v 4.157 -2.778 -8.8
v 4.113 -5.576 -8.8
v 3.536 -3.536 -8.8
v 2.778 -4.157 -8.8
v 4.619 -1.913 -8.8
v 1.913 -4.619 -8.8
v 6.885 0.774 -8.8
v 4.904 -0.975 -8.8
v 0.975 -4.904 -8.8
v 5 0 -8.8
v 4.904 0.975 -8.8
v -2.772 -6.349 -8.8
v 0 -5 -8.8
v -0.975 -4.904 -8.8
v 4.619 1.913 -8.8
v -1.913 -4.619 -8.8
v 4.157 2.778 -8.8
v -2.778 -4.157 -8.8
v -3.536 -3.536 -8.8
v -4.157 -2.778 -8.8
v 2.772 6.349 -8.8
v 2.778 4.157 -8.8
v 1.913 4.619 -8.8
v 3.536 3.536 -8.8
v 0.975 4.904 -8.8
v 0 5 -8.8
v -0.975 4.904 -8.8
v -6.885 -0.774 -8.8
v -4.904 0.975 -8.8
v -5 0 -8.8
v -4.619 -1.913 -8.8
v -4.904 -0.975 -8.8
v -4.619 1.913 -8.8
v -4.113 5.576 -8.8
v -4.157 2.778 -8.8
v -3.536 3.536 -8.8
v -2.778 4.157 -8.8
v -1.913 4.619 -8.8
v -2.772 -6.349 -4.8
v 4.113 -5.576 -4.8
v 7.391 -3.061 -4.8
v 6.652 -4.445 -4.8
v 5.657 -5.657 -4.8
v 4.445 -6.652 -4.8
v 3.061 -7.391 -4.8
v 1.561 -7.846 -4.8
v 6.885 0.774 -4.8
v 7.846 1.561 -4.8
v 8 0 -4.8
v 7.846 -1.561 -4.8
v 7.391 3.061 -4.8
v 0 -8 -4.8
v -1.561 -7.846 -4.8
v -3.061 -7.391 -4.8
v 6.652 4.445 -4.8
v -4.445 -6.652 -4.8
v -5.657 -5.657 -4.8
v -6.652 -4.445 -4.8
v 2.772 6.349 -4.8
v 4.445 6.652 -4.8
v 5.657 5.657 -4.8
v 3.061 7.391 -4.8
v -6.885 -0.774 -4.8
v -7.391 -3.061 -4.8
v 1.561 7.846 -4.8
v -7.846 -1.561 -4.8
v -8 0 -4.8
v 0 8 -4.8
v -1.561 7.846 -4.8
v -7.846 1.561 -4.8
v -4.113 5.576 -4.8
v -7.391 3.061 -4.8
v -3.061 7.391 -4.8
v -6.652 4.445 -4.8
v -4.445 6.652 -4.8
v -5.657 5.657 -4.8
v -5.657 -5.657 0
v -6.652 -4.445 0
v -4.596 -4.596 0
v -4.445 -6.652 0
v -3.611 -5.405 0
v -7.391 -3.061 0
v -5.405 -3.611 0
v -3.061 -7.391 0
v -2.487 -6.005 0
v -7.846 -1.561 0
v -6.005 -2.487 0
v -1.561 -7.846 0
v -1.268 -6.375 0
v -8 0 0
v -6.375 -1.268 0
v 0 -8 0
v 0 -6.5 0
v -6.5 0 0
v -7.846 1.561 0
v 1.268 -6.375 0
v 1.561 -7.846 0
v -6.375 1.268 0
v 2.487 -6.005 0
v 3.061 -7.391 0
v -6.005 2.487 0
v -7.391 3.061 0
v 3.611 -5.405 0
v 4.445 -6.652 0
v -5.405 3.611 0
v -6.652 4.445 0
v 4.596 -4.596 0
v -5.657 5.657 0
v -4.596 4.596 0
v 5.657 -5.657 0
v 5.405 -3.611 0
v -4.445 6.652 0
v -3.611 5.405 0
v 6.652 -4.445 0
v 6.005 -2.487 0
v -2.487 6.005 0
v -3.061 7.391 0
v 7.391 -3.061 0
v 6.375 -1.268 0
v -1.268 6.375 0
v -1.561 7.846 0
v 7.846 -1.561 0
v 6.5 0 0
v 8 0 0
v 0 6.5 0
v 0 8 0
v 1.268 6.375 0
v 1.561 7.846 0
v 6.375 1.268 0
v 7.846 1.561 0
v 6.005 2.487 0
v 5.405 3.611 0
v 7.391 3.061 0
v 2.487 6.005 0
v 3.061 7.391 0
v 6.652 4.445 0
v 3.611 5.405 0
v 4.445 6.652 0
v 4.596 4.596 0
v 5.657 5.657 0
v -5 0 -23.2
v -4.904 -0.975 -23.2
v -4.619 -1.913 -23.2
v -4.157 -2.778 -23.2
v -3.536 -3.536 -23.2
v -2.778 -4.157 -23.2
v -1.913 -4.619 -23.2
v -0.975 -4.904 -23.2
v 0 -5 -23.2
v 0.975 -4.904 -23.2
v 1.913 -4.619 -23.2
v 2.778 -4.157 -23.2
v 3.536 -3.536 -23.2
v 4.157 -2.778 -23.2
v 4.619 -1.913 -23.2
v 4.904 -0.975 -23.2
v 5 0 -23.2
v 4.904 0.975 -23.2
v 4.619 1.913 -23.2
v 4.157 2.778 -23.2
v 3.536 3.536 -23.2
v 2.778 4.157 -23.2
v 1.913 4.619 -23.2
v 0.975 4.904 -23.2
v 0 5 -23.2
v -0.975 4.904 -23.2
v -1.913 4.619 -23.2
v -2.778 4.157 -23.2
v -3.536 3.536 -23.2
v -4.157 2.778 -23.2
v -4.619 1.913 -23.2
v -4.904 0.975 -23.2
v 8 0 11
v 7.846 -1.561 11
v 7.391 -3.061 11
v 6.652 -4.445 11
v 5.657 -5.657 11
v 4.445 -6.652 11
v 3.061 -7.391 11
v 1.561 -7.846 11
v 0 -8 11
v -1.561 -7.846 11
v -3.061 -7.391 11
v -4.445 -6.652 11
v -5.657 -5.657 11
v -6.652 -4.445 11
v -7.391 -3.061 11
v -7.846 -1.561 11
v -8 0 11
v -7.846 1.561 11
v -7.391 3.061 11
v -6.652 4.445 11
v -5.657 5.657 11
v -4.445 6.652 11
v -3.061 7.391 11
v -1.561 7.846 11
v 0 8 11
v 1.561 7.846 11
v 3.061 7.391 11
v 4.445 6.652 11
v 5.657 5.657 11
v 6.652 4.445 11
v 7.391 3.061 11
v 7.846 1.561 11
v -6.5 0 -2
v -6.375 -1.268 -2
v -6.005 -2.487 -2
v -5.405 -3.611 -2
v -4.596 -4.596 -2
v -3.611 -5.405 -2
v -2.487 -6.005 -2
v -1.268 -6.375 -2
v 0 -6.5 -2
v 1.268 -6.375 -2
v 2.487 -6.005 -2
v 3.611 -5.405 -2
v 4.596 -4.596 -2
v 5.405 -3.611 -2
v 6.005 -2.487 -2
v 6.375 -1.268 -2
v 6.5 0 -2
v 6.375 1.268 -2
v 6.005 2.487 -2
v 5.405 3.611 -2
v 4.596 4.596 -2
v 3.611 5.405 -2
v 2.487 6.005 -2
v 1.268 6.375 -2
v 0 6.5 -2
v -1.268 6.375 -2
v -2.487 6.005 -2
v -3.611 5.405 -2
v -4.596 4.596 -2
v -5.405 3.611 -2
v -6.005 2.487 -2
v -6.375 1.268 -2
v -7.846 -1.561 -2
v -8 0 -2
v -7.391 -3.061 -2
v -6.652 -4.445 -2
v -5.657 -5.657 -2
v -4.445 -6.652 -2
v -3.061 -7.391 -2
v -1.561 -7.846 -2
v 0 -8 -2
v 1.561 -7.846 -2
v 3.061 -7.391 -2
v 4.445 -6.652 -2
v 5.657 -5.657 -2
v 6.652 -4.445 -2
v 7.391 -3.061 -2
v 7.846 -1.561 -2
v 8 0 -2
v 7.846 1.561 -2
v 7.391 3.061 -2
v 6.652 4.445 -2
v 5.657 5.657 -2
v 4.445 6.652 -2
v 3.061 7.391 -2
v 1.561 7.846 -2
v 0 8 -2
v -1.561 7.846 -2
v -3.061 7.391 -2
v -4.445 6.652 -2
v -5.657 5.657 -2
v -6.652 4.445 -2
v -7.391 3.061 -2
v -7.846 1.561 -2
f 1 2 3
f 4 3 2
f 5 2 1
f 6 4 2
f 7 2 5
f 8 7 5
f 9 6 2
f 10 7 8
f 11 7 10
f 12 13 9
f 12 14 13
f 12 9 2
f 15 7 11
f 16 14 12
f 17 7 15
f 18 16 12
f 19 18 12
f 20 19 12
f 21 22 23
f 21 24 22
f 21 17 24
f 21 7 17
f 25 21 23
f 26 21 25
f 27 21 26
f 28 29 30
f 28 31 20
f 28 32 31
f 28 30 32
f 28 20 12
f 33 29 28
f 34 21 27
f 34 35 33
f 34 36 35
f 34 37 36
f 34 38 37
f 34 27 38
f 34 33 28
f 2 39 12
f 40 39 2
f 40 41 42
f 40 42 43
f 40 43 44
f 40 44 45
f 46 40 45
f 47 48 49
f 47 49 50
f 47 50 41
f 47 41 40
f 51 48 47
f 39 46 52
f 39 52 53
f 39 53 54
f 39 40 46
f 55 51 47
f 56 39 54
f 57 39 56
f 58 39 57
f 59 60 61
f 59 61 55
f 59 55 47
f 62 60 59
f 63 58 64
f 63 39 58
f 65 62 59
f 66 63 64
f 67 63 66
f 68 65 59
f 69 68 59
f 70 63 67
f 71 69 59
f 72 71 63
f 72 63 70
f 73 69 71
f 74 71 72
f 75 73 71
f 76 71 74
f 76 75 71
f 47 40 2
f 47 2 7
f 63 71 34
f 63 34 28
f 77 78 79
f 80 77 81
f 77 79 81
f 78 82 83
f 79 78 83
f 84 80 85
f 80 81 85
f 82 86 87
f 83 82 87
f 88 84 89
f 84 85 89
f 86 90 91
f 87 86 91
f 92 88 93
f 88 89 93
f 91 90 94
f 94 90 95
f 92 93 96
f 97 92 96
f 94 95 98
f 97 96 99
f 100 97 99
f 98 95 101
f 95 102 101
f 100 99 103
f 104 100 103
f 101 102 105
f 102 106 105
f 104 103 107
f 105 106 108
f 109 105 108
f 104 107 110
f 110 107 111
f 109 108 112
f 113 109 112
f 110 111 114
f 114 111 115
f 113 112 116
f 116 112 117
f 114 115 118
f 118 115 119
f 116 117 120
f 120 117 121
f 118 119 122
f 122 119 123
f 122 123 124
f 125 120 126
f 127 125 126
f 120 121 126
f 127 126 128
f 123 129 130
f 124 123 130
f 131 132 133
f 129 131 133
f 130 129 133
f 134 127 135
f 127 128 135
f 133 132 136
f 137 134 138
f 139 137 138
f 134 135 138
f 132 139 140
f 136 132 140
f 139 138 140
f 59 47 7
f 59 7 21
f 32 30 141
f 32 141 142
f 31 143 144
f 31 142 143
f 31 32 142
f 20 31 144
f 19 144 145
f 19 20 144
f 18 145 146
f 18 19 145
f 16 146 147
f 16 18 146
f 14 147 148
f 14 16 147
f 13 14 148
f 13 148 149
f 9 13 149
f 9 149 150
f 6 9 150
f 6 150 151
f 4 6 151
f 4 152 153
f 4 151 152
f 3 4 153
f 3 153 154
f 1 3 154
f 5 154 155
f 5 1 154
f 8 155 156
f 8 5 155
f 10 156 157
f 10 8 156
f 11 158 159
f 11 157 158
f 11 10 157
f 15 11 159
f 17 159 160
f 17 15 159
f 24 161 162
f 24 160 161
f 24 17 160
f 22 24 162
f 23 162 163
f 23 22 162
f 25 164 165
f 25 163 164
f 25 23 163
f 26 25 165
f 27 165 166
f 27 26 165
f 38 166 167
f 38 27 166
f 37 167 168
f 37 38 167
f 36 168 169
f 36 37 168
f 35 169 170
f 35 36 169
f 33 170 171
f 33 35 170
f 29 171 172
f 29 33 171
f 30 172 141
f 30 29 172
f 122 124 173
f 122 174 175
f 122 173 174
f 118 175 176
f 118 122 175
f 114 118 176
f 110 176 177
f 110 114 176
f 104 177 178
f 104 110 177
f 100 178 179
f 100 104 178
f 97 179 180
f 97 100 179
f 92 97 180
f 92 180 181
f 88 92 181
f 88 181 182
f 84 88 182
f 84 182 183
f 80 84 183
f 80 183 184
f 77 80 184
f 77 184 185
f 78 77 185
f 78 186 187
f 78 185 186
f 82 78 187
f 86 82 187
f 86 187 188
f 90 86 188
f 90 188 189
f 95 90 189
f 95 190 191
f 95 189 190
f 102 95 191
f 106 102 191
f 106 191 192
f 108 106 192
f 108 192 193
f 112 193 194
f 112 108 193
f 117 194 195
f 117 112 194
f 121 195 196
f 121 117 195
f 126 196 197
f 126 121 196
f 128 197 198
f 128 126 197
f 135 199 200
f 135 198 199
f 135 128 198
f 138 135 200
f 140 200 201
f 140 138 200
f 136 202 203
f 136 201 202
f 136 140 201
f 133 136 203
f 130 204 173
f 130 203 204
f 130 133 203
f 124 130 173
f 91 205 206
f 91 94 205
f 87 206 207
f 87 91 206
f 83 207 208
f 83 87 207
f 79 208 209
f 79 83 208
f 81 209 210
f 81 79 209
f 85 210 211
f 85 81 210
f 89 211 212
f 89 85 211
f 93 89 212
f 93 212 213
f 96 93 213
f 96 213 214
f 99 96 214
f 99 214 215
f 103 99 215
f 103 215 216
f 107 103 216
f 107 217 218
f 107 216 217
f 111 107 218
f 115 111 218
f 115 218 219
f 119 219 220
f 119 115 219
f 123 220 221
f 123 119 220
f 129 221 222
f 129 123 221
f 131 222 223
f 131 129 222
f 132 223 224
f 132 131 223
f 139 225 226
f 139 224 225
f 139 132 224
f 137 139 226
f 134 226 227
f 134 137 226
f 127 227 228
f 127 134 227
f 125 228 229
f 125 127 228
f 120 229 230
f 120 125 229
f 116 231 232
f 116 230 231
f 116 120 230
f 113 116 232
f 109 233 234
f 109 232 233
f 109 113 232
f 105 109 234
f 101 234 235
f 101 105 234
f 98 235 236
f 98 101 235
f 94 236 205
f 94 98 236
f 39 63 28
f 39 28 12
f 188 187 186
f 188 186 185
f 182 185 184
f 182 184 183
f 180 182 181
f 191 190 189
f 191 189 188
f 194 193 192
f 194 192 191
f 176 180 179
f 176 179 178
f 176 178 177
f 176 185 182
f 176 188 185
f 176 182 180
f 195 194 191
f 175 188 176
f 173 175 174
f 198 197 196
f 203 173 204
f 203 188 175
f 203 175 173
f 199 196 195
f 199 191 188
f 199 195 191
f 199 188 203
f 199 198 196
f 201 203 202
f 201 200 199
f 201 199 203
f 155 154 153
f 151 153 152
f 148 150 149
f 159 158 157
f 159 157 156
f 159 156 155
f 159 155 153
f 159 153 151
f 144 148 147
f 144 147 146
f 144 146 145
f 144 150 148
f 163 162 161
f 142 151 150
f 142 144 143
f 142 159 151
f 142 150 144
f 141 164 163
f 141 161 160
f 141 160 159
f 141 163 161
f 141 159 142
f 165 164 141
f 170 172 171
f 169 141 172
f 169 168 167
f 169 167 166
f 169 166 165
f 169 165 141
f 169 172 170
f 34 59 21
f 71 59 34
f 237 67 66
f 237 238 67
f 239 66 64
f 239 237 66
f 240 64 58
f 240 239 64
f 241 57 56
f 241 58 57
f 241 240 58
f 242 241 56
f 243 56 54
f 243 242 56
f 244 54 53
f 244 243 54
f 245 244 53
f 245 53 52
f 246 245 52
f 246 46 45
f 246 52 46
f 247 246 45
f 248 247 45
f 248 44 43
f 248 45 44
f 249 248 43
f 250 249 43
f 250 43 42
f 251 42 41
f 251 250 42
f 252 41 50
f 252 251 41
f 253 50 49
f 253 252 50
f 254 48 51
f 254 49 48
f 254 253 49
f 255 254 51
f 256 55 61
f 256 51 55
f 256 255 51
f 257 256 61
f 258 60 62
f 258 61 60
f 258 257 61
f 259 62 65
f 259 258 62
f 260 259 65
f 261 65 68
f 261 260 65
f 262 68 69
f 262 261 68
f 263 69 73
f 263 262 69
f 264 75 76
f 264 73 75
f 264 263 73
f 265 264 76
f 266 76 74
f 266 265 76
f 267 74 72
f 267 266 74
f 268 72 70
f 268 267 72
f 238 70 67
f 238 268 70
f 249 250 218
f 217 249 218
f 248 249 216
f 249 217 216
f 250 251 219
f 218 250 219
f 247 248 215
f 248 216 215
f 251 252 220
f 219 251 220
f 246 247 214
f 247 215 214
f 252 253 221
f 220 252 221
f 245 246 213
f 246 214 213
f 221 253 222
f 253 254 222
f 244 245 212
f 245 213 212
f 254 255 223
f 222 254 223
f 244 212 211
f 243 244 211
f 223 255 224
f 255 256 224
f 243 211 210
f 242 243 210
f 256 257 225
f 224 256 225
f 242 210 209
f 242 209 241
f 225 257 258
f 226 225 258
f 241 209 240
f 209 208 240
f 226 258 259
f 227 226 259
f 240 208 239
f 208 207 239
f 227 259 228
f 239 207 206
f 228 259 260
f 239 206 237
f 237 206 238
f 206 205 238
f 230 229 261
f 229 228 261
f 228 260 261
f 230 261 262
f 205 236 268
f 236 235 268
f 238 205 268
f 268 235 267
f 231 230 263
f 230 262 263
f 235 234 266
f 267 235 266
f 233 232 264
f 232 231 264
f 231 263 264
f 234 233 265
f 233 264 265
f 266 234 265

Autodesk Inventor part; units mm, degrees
ref_plane "YZ Plane" through (0, 0, 0) normal (1, 0, 0) x (0, 1, 0)
ref_plane "XZ Plane" through (0, 0, 0) normal (0, 1, 0) x (-1, 0, 0)
ref_plane "XY Plane" through (0, 0, 0) normal (0, 0, 1) x (1, 0, 0)
sketch "Sketch1" plane through (0, 0, 0) normal (0, 0, 1) x (1, 0, 0)
  circle A0 centre (0, 0) radius 8
  dimension "d0" = 16
extrude "Extrusion1" add sketch "Sketch1" along normal blind 11
sketch "Sketch2" plane through (0, 0, 0) normal (0, 0, -1) x (-1, 0, 0)
  circle A0 centre (0, 0) radius 6.5
  dimension "d3" = 13
extrude "Extrusion2" add sketch "Sketch2" along normal blind 2
sketch "Sketch3" plane through (0, 0, -2) normal (0, 0, -1) x (-1, 0, 0)
  circle A0 centre (0, 0) radius 8
  dimension "d6" = 16
extrude "Extrusion3" add sketch "Sketch3" along normal blind 2.8
sketch "Sketch4" plane through (0, 0, -4.8) normal (0, 0, -1) x (-1, 0, 0)
  line L0 (-2.7723, 6.3494) -> (4.1126, 5.5756)
  line L1 (4.1126, 5.5756) -> (6.8849, -0.7738)
  line L2 (6.8849, -0.7738) -> (2.7723, -6.3494)
  line L3 (2.7723, -6.3494) -> (-4.1126, -5.5756)
  line L4 (-4.1126, -5.5756) -> (-6.8849, 0.7738)
  line L5 (-6.8849, 0.7738) -> (-2.7723, 6.3494)
  point P0 (0, 0)
  point P1 (0, 0)
  dimension "d9" = 6
extrude "Extrusion4" add sketch "Sketch4" along normal blind 4
sketch "Sketch5" plane through (0, 0, -8.8) normal (0, 0, -1) x (-1, 0, 0)
  circle A0 centre (0, 0) radius 5
  dimension "d12" = 10
extrude "Extrusion5" add sketch "Sketch5" along normal blind 14.4
properties part number "HTC-30M_5x20mmFuse_Holder"
